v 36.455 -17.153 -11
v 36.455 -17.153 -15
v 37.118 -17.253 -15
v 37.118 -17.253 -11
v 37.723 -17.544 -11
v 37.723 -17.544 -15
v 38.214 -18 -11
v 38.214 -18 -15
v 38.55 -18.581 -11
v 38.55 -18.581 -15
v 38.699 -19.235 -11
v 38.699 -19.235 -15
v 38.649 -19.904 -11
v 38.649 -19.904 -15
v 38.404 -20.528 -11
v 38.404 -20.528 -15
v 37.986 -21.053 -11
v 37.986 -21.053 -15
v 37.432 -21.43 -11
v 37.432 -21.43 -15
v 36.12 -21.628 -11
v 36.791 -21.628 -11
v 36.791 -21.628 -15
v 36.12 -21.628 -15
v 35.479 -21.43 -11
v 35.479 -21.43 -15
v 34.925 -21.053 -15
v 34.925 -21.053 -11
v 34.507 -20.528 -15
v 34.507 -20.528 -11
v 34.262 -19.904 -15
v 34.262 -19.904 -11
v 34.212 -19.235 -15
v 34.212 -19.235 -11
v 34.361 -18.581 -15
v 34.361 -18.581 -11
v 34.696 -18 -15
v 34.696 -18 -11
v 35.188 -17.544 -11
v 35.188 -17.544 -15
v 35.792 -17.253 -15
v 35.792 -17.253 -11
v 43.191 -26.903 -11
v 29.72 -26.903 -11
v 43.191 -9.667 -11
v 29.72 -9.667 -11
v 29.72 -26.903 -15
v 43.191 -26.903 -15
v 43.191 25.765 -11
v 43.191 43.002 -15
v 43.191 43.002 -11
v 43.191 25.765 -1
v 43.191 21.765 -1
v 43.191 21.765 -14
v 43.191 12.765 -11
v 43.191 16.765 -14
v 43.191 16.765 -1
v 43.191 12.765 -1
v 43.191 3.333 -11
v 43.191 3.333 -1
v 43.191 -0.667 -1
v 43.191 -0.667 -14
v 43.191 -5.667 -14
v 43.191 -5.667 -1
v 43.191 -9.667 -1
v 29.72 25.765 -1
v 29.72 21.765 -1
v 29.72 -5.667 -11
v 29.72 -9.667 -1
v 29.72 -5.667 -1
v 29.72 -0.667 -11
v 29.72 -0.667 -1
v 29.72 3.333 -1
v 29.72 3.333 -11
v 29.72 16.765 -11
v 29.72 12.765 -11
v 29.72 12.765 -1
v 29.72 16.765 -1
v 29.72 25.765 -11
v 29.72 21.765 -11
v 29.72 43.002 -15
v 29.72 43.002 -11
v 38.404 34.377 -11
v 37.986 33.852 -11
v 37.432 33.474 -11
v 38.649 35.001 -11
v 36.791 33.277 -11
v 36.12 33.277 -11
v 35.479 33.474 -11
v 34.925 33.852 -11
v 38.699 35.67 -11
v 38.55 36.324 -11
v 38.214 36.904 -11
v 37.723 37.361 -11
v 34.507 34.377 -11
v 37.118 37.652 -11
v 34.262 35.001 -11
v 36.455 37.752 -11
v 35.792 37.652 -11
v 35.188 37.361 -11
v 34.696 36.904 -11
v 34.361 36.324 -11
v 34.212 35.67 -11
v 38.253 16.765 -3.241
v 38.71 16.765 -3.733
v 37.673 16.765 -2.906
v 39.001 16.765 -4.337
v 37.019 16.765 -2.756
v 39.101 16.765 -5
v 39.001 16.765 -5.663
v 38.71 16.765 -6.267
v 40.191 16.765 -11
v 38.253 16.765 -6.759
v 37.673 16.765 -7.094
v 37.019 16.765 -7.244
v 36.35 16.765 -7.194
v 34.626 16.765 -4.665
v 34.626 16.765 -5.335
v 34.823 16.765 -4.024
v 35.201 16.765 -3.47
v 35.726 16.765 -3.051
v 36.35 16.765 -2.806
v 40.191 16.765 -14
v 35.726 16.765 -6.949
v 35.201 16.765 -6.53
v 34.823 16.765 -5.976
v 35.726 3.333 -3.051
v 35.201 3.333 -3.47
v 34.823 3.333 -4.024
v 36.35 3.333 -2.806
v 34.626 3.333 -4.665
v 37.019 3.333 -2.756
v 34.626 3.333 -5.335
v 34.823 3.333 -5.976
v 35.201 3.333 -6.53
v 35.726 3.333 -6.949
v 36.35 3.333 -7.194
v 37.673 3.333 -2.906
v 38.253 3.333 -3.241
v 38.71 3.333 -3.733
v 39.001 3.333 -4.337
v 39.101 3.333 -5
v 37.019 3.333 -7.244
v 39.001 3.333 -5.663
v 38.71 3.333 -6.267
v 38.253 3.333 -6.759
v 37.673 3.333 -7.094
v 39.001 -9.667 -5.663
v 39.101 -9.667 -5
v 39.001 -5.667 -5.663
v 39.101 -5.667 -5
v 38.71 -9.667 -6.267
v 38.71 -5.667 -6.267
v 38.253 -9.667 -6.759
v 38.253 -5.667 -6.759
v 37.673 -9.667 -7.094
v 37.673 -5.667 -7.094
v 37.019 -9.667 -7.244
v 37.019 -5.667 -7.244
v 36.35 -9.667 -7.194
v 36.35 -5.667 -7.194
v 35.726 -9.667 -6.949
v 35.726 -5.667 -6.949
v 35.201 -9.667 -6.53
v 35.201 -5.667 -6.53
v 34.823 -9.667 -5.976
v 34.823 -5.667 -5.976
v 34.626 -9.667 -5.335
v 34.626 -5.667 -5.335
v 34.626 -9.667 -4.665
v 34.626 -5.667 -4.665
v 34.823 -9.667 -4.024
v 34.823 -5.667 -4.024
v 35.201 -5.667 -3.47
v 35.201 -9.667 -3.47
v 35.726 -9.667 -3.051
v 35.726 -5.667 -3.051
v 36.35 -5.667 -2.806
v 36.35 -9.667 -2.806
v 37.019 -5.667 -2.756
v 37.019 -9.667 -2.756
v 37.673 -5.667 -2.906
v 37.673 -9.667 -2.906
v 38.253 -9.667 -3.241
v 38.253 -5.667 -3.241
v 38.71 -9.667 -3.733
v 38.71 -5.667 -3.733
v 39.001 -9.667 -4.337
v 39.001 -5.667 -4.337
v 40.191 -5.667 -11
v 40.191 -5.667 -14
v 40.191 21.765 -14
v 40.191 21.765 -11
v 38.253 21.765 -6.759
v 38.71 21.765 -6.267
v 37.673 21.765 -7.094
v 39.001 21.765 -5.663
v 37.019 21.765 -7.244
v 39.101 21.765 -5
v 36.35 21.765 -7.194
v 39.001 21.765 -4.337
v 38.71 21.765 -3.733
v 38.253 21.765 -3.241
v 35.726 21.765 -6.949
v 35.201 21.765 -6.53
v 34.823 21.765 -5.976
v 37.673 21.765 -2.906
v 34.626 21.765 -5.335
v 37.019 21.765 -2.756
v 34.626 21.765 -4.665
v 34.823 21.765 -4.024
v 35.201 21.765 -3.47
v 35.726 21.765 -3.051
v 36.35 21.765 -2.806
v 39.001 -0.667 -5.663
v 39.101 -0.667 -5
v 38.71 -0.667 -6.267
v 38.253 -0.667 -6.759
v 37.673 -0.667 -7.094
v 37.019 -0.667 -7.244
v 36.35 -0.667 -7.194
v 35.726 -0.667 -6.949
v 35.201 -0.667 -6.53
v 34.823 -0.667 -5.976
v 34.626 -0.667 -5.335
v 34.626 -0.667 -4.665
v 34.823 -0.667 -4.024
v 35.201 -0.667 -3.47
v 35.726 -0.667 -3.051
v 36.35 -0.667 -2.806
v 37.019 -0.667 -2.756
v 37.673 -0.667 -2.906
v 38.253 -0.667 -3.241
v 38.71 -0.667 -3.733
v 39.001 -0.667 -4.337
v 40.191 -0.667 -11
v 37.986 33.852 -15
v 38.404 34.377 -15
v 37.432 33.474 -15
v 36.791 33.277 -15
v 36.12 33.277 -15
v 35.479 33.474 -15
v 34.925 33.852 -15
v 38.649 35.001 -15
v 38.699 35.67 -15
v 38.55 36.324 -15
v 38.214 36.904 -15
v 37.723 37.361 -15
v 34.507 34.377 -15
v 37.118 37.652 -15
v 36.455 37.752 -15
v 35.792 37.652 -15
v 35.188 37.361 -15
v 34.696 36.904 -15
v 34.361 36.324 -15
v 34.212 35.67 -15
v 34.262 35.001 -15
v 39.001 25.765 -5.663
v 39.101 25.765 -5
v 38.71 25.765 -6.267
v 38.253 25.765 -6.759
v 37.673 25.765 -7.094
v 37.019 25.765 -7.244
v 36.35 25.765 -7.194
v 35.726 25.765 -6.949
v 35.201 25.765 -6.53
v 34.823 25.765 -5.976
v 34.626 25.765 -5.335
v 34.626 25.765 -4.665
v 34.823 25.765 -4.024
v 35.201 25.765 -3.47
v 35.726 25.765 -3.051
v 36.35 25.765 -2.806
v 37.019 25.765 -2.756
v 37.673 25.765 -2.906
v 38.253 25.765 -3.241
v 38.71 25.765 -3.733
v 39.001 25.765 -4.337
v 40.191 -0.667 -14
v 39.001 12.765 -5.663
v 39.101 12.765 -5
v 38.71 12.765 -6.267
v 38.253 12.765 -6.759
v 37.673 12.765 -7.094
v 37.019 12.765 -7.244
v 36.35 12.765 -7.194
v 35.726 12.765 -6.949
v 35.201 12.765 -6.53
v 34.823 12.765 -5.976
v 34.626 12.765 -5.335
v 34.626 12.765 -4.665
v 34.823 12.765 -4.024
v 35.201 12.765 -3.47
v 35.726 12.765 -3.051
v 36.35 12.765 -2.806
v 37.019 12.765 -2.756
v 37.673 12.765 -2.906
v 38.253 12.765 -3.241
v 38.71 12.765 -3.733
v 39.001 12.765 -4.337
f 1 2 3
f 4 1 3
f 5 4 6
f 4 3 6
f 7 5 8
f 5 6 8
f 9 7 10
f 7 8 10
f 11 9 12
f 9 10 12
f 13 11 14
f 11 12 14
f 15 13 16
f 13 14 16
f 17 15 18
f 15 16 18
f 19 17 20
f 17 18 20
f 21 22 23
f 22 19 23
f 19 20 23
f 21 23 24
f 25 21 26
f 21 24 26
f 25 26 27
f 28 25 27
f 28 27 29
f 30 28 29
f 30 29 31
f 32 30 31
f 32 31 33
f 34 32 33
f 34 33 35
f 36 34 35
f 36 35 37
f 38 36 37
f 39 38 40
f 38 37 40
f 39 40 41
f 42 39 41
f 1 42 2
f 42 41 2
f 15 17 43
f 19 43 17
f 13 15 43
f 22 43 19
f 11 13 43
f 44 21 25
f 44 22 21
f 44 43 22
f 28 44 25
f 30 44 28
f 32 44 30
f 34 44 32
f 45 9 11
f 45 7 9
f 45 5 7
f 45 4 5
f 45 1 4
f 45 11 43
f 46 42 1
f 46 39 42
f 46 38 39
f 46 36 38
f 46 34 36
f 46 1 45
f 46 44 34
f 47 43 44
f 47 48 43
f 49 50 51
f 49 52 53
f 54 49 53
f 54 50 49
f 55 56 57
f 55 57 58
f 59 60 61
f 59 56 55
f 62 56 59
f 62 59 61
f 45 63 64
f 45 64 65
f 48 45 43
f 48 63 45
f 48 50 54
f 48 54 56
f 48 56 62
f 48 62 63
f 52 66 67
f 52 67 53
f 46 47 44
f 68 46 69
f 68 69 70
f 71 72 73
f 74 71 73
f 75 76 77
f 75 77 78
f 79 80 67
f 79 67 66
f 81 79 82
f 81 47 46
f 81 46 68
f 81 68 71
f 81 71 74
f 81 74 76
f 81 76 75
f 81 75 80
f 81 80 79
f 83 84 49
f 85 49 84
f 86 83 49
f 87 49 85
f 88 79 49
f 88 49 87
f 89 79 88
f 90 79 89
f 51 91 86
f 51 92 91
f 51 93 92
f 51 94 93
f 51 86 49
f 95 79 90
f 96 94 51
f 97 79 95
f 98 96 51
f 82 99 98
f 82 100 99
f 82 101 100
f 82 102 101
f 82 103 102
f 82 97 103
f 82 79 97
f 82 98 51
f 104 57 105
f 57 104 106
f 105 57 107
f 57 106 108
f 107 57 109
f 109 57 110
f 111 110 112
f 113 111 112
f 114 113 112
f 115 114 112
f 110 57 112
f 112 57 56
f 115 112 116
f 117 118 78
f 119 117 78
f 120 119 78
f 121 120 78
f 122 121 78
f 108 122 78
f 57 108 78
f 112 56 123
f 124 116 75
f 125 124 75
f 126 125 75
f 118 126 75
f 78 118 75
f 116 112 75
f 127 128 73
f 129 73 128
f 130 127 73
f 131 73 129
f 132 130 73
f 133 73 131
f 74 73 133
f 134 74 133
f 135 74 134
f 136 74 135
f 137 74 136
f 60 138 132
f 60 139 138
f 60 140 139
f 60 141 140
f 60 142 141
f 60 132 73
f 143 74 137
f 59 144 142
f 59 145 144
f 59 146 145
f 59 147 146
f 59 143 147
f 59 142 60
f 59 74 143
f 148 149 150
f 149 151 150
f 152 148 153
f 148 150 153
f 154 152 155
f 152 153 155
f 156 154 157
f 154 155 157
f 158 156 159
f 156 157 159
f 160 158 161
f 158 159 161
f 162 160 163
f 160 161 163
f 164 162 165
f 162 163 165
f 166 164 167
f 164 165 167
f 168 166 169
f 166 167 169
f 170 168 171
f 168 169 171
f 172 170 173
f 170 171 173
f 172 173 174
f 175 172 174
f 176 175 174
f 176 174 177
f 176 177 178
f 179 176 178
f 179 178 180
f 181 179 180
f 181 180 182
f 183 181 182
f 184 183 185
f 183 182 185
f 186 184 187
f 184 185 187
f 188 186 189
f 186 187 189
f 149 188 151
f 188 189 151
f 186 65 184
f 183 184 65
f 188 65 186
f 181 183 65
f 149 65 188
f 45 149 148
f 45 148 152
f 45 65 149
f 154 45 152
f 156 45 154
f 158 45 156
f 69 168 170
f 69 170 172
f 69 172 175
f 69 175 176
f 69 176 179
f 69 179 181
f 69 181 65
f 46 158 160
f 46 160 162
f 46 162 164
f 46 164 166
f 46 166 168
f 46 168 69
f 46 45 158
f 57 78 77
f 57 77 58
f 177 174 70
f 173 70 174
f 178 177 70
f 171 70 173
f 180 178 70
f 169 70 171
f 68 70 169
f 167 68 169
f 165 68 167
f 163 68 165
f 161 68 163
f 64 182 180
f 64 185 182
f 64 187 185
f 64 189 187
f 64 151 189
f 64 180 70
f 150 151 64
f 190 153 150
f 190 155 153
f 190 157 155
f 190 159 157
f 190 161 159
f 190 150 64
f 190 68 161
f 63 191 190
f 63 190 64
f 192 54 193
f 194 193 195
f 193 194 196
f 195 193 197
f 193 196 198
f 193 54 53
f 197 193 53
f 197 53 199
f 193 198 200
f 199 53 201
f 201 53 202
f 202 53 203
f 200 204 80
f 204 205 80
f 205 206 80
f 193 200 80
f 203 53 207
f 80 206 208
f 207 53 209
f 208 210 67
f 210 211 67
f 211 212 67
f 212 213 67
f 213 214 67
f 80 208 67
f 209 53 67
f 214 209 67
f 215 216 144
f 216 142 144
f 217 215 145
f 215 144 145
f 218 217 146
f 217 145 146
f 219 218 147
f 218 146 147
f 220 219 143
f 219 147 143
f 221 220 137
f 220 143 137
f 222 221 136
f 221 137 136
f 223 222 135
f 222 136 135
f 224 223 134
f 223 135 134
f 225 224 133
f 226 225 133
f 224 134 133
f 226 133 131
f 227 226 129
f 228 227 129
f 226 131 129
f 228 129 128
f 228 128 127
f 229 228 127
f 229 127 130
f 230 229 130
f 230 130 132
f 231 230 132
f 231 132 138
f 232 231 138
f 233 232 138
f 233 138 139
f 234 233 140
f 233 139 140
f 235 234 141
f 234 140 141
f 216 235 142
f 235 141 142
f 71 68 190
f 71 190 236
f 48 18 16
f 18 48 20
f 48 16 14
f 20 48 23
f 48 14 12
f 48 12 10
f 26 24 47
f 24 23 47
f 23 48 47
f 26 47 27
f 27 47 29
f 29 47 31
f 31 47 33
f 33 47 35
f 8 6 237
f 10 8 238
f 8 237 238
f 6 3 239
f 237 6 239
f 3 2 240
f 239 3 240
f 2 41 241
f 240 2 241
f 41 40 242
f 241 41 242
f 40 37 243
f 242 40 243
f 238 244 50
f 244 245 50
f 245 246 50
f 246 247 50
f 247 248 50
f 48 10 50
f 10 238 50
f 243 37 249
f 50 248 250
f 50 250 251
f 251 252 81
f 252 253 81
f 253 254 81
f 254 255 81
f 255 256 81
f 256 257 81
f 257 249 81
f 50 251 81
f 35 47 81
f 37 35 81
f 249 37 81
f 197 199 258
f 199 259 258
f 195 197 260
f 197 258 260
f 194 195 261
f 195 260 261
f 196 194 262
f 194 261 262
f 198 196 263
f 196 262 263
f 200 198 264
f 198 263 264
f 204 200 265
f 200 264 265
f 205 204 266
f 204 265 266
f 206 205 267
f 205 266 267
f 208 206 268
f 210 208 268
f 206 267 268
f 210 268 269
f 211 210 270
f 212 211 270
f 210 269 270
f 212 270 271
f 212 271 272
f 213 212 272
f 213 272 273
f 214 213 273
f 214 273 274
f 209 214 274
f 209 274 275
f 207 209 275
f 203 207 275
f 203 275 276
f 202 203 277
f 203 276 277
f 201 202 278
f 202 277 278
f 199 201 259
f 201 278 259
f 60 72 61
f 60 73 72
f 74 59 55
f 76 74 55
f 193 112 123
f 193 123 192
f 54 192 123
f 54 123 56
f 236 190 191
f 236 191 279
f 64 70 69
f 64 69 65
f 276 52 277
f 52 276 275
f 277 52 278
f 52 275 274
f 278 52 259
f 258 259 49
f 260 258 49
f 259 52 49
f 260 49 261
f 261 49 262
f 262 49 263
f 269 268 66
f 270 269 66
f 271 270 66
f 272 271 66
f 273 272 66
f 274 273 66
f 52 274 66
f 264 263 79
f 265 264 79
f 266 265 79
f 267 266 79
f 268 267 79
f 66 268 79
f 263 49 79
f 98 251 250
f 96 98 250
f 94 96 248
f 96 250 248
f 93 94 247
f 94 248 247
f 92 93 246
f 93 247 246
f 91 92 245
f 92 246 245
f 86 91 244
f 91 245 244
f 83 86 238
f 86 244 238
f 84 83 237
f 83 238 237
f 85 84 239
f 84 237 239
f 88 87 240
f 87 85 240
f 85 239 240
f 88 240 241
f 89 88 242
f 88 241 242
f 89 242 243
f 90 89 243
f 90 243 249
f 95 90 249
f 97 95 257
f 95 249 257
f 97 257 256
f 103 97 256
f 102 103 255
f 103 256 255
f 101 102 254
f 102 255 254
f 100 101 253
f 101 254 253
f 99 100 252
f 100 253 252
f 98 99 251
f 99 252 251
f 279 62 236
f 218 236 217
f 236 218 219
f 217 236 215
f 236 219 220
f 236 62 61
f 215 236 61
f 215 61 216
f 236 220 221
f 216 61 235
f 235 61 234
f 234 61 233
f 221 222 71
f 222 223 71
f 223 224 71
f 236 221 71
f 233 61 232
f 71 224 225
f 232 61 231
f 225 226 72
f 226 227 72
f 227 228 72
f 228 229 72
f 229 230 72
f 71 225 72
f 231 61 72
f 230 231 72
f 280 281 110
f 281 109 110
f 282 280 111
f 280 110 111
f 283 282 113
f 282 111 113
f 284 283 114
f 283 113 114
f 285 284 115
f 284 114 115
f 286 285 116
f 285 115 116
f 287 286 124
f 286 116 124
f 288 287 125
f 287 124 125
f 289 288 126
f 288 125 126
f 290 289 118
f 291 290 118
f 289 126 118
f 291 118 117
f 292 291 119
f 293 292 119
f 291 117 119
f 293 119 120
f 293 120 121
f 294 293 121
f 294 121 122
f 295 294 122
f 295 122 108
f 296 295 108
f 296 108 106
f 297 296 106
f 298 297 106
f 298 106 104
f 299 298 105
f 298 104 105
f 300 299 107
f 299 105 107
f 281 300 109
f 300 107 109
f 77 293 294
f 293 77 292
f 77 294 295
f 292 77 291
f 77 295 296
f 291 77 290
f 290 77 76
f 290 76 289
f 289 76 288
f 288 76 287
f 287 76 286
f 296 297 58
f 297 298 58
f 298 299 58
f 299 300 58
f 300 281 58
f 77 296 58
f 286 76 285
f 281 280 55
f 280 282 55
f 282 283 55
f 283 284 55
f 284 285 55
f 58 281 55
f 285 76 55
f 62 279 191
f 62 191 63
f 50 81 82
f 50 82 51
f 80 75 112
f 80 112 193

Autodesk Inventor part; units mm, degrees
ref_plane "YZ Plane" through (0, 0, 0) normal (1, 0, 0) x (0, 1, 0)
ref_plane "XZ Plane" through (0, 0, 0) normal (0, 1, 0) x (-1, 0, 0)
ref_plane "XY Plane" through (0, 0, 0) normal (0, 0, 1) x (1, 0, 0)
ref_plane "Plan de construction1" through (24.857, 8.2218, -15) normal (0, 0, 1) x (0, 1, 0)
sketch "Esquisse1" plane through (24.857, 8.2218, -15) normal (0, 0, 1) x (0, 1, 0)
  circle A0 centre (-27.625, -11.5983) radius 2.25 projected
  circle A1 centre (27.2798, -11.5983) radius 2.25 projected
  circle A2 centre (-14.9765, -0.1949) radius 2.15 projected
  circle A3 centre (15.0235, -0.1949) radius 2.15 projected
  line L0 (34.7798, -18.3341) -> (-35.125, -18.3341) projected
  line L1 (34.7798, -4.8625) -> (34.7798, -18.3341) projected
  line L2 (20.0235, -4.8625) -> (34.7798, -4.8625) projected
  line L3 (20.0235, -4.8625) -> (20.0235, 5.1375) projected
  line L4 (20.0235, 5.1375) -> (11.0235, 5.1375) projected
  line L5 (11.0235, 5.1375) -> (11.0235, -13.773) projected
  line L6 (11.0235, -13.773) -> (-11.125, -13.773) projected
  line L7 (-11.125, -13.773) -> (-11.125, 5.1375) projected
  line L8 (-11.125, 5.1375) -> (-20.125, 5.1375) projected
  line L9 (-20.125, 5.1375) -> (-20.125, -4.8625) projected
  line L10 (-35.125, -4.8625) -> (-20.125, -4.8625) projected
  line L11 (-35.125, -18.3341) -> (-35.125, -4.8625) projected
  line L12 (34.7798, -18.3341) -> (-35.125, -18.3341)
  line L13 (-35.125, -18.3341) -> (-35.125, -4.8625)
  line L14 (-35.125, -4.8625) -> (34.7798, -4.8625)
  line L15 (34.7798, -4.8625) -> (34.7798, -18.3341)
  point P0 (-8.2218, 24.857)
extrude "Extrusion1" add sketch "Esquisse1" along normal blind 4 contours L0 L11 L10 L14 L7 L6 L5 L2 L1 | L5 L6 L7 L14
sketch "Esquisse2" plane through (24.857, 8.2218, -11) normal (0, 0, 1) x (1, 0, 0)
  circle A0 centre (11.5983, -27.625) radius 2.25 projected
  circle A1 centre (11.5983, 27.2798) radius 2.25 projected
  circle A2 centre (0.1949, -14.9765) radius 2.15 projected
  circle A3 centre (0.1949, 15.0235) radius 2.15 projected
  line L0 (18.3341, 34.7798) -> (18.3341, -35.125) projected
  line L1 (4.8625, 34.7798) -> (18.3341, 34.7798) projected
  line L2 (4.8625, 20.0235) -> (4.8625, 34.7798) projected
  line L3 (4.8625, 20.0235) -> (-5.1375, 20.0235) projected
  line L4 (-5.1375, 20.0235) -> (-5.1375, 11.0235) projected
  line L5 (-5.1375, 11.0235) -> (13.773, 11.0235) projected
  line L6 (13.773, 11.0235) -> (13.773, -11.125) projected
  line L7 (13.773, -11.125) -> (-5.1375, -11.125) projected
  line L8 (-5.1375, -11.125) -> (-5.1375, -20.125) projected
  line L9 (-5.1375, -20.125) -> (4.8625, -20.125) projected
  line L10 (4.8625, -35.125) -> (4.8625, -20.125) projected
  line L11 (18.3341, -35.125) -> (4.8625, -35.125) projected
  line L12 (18.3341, -35.125) -> (18.3341, 34.7798) projected
  line L13 (4.8625, 34.7798) -> (4.8625, -35.125) projected
  line L14 (18.3341, 17.5433) -> (4.8625, 17.5433)
  line L15 (4.8625, 17.5433) -> (4.8625, 13.5433)
  line L16 (4.8625, 13.5433) -> (18.3341, 13.5433)
  line L17 (18.3341, 13.5433) -> (18.3341, 17.5433)
  line L18 (18.3341, -0.1726) -> (4.8625, -0.1726) construction
  line L19 (18.3341, 13.5433) -> (18.3341, 8.5433) construction
  line L20 (18.3341, 8.5433) -> (4.8625, 8.5433)
  line L21 (4.8625, 8.5433) -> (4.8625, 4.5433)
  line L22 (4.8625, 4.5433) -> (18.3341, 4.5433)
  line L23 (18.3341, 4.5433) -> (18.3341, 8.5433)
  line L24 (4.8625, -35.125) -> (4.8625, 34.7798)
  line L25 (18.3341, -17.8886) -> (4.8625, -17.8886)
  line L26 (4.8625, -17.8886) -> (4.8625, -13.8886)
  line L27 (4.8625, -13.8886) -> (18.3341, -13.8886)
  line L28 (18.3341, -13.8886) -> (18.3341, -17.8886)
  line L29 (18.3341, -8.8886) -> (4.8625, -8.8886)
  line L30 (4.8625, -8.8886) -> (4.8625, -4.8886)
  line L31 (4.8625, -4.8886) -> (18.3341, -4.8886)
  line L32 (18.3341, -4.8886) -> (18.3341, -8.8886)
  point P0 (-24.857, -8.2218)
  dimension "d2" = 4
  dimension "d3" = 5
  dimension "d4" = 4
extrude "Extrusion2" add sketch "Esquisse2" along normal blind 10 contours L0 L16 L13 L14 | L0 L22 L6 L20 | L6 L22 L13 L20 | L0 L29 L6 L31 | L6 L29 L13 L31 | L0 L25 L13 L27
sketch "Esquisse3" plane through (29.7194, 25.7651, -11) normal (0, 1, 0) x (1, 0, 0)
  circle A0 centre (7.1312, -6) radius 2.25
  line L0 (13.4716, -10) -> (0, -10) projected
  point P0 (-29.7194, -11)
  dimension "d7" = 4.5
  dimension "d8" = 4
extrude "Extrusion3" cut sketch "Esquisse3" against normal blind 55.75
sketch "Esquisse4" plane through (24.857, 8.2218, -11) normal (0, 0, 1) x (1, 0, 0)
  line L0 (18.3341, 13.5433) -> (4.8625, 13.5433) projected
  line L1 (4.8625, 13.5433) -> (4.8625, 8.5433) projected
  line L2 (4.8625, 8.5433) -> (18.3341, 8.5433) projected
  line L3 (18.3341, 8.5433) -> (18.3341, 13.5433) projected
  line L4 (18.3341, -8.8886) -> (4.8625, -8.8886) projected
  line L5 (4.8625, -8.8886) -> (4.8625, -13.8886) projected
  line L6 (4.8625, -13.8886) -> (18.3341, -13.8886) projected
  line L7 (18.3341, -13.8886) -> (18.3341, -8.8886) projected
  line L8 (4.8625, 13.5433) -> (18.3341, 13.5433) projected
  line L9 (18.3341, 8.5433) -> (15.3341, 8.5433)
  line L10 (15.3341, 8.5433) -> (15.3341, 13.5433)
  line L11 (15.3341, 13.5433) -> (18.3341, 13.5433)
  line L12 (18.3341, 13.5433) -> (18.3341, 8.5433)
  line L13 (18.3341, -13.8886) -> (15.3341, -13.8886)
  line L14 (15.3341, -13.8886) -> (15.3341, -8.8886)
  line L15 (15.3341, -8.8886) -> (18.3341, -8.8886)
  line L16 (18.3341, -8.8886) -> (18.3341, -13.8886)
  point P0 (-24.857, -8.2218)
  dimension "d11" = 3
  dimension "d12" = 3
extrude "Extrusion4" cut sketch "Esquisse4" against normal blind 3 contours L3 L2 L10 L0 | L7 L6 L14 L4
properties part number "enclenchement"
